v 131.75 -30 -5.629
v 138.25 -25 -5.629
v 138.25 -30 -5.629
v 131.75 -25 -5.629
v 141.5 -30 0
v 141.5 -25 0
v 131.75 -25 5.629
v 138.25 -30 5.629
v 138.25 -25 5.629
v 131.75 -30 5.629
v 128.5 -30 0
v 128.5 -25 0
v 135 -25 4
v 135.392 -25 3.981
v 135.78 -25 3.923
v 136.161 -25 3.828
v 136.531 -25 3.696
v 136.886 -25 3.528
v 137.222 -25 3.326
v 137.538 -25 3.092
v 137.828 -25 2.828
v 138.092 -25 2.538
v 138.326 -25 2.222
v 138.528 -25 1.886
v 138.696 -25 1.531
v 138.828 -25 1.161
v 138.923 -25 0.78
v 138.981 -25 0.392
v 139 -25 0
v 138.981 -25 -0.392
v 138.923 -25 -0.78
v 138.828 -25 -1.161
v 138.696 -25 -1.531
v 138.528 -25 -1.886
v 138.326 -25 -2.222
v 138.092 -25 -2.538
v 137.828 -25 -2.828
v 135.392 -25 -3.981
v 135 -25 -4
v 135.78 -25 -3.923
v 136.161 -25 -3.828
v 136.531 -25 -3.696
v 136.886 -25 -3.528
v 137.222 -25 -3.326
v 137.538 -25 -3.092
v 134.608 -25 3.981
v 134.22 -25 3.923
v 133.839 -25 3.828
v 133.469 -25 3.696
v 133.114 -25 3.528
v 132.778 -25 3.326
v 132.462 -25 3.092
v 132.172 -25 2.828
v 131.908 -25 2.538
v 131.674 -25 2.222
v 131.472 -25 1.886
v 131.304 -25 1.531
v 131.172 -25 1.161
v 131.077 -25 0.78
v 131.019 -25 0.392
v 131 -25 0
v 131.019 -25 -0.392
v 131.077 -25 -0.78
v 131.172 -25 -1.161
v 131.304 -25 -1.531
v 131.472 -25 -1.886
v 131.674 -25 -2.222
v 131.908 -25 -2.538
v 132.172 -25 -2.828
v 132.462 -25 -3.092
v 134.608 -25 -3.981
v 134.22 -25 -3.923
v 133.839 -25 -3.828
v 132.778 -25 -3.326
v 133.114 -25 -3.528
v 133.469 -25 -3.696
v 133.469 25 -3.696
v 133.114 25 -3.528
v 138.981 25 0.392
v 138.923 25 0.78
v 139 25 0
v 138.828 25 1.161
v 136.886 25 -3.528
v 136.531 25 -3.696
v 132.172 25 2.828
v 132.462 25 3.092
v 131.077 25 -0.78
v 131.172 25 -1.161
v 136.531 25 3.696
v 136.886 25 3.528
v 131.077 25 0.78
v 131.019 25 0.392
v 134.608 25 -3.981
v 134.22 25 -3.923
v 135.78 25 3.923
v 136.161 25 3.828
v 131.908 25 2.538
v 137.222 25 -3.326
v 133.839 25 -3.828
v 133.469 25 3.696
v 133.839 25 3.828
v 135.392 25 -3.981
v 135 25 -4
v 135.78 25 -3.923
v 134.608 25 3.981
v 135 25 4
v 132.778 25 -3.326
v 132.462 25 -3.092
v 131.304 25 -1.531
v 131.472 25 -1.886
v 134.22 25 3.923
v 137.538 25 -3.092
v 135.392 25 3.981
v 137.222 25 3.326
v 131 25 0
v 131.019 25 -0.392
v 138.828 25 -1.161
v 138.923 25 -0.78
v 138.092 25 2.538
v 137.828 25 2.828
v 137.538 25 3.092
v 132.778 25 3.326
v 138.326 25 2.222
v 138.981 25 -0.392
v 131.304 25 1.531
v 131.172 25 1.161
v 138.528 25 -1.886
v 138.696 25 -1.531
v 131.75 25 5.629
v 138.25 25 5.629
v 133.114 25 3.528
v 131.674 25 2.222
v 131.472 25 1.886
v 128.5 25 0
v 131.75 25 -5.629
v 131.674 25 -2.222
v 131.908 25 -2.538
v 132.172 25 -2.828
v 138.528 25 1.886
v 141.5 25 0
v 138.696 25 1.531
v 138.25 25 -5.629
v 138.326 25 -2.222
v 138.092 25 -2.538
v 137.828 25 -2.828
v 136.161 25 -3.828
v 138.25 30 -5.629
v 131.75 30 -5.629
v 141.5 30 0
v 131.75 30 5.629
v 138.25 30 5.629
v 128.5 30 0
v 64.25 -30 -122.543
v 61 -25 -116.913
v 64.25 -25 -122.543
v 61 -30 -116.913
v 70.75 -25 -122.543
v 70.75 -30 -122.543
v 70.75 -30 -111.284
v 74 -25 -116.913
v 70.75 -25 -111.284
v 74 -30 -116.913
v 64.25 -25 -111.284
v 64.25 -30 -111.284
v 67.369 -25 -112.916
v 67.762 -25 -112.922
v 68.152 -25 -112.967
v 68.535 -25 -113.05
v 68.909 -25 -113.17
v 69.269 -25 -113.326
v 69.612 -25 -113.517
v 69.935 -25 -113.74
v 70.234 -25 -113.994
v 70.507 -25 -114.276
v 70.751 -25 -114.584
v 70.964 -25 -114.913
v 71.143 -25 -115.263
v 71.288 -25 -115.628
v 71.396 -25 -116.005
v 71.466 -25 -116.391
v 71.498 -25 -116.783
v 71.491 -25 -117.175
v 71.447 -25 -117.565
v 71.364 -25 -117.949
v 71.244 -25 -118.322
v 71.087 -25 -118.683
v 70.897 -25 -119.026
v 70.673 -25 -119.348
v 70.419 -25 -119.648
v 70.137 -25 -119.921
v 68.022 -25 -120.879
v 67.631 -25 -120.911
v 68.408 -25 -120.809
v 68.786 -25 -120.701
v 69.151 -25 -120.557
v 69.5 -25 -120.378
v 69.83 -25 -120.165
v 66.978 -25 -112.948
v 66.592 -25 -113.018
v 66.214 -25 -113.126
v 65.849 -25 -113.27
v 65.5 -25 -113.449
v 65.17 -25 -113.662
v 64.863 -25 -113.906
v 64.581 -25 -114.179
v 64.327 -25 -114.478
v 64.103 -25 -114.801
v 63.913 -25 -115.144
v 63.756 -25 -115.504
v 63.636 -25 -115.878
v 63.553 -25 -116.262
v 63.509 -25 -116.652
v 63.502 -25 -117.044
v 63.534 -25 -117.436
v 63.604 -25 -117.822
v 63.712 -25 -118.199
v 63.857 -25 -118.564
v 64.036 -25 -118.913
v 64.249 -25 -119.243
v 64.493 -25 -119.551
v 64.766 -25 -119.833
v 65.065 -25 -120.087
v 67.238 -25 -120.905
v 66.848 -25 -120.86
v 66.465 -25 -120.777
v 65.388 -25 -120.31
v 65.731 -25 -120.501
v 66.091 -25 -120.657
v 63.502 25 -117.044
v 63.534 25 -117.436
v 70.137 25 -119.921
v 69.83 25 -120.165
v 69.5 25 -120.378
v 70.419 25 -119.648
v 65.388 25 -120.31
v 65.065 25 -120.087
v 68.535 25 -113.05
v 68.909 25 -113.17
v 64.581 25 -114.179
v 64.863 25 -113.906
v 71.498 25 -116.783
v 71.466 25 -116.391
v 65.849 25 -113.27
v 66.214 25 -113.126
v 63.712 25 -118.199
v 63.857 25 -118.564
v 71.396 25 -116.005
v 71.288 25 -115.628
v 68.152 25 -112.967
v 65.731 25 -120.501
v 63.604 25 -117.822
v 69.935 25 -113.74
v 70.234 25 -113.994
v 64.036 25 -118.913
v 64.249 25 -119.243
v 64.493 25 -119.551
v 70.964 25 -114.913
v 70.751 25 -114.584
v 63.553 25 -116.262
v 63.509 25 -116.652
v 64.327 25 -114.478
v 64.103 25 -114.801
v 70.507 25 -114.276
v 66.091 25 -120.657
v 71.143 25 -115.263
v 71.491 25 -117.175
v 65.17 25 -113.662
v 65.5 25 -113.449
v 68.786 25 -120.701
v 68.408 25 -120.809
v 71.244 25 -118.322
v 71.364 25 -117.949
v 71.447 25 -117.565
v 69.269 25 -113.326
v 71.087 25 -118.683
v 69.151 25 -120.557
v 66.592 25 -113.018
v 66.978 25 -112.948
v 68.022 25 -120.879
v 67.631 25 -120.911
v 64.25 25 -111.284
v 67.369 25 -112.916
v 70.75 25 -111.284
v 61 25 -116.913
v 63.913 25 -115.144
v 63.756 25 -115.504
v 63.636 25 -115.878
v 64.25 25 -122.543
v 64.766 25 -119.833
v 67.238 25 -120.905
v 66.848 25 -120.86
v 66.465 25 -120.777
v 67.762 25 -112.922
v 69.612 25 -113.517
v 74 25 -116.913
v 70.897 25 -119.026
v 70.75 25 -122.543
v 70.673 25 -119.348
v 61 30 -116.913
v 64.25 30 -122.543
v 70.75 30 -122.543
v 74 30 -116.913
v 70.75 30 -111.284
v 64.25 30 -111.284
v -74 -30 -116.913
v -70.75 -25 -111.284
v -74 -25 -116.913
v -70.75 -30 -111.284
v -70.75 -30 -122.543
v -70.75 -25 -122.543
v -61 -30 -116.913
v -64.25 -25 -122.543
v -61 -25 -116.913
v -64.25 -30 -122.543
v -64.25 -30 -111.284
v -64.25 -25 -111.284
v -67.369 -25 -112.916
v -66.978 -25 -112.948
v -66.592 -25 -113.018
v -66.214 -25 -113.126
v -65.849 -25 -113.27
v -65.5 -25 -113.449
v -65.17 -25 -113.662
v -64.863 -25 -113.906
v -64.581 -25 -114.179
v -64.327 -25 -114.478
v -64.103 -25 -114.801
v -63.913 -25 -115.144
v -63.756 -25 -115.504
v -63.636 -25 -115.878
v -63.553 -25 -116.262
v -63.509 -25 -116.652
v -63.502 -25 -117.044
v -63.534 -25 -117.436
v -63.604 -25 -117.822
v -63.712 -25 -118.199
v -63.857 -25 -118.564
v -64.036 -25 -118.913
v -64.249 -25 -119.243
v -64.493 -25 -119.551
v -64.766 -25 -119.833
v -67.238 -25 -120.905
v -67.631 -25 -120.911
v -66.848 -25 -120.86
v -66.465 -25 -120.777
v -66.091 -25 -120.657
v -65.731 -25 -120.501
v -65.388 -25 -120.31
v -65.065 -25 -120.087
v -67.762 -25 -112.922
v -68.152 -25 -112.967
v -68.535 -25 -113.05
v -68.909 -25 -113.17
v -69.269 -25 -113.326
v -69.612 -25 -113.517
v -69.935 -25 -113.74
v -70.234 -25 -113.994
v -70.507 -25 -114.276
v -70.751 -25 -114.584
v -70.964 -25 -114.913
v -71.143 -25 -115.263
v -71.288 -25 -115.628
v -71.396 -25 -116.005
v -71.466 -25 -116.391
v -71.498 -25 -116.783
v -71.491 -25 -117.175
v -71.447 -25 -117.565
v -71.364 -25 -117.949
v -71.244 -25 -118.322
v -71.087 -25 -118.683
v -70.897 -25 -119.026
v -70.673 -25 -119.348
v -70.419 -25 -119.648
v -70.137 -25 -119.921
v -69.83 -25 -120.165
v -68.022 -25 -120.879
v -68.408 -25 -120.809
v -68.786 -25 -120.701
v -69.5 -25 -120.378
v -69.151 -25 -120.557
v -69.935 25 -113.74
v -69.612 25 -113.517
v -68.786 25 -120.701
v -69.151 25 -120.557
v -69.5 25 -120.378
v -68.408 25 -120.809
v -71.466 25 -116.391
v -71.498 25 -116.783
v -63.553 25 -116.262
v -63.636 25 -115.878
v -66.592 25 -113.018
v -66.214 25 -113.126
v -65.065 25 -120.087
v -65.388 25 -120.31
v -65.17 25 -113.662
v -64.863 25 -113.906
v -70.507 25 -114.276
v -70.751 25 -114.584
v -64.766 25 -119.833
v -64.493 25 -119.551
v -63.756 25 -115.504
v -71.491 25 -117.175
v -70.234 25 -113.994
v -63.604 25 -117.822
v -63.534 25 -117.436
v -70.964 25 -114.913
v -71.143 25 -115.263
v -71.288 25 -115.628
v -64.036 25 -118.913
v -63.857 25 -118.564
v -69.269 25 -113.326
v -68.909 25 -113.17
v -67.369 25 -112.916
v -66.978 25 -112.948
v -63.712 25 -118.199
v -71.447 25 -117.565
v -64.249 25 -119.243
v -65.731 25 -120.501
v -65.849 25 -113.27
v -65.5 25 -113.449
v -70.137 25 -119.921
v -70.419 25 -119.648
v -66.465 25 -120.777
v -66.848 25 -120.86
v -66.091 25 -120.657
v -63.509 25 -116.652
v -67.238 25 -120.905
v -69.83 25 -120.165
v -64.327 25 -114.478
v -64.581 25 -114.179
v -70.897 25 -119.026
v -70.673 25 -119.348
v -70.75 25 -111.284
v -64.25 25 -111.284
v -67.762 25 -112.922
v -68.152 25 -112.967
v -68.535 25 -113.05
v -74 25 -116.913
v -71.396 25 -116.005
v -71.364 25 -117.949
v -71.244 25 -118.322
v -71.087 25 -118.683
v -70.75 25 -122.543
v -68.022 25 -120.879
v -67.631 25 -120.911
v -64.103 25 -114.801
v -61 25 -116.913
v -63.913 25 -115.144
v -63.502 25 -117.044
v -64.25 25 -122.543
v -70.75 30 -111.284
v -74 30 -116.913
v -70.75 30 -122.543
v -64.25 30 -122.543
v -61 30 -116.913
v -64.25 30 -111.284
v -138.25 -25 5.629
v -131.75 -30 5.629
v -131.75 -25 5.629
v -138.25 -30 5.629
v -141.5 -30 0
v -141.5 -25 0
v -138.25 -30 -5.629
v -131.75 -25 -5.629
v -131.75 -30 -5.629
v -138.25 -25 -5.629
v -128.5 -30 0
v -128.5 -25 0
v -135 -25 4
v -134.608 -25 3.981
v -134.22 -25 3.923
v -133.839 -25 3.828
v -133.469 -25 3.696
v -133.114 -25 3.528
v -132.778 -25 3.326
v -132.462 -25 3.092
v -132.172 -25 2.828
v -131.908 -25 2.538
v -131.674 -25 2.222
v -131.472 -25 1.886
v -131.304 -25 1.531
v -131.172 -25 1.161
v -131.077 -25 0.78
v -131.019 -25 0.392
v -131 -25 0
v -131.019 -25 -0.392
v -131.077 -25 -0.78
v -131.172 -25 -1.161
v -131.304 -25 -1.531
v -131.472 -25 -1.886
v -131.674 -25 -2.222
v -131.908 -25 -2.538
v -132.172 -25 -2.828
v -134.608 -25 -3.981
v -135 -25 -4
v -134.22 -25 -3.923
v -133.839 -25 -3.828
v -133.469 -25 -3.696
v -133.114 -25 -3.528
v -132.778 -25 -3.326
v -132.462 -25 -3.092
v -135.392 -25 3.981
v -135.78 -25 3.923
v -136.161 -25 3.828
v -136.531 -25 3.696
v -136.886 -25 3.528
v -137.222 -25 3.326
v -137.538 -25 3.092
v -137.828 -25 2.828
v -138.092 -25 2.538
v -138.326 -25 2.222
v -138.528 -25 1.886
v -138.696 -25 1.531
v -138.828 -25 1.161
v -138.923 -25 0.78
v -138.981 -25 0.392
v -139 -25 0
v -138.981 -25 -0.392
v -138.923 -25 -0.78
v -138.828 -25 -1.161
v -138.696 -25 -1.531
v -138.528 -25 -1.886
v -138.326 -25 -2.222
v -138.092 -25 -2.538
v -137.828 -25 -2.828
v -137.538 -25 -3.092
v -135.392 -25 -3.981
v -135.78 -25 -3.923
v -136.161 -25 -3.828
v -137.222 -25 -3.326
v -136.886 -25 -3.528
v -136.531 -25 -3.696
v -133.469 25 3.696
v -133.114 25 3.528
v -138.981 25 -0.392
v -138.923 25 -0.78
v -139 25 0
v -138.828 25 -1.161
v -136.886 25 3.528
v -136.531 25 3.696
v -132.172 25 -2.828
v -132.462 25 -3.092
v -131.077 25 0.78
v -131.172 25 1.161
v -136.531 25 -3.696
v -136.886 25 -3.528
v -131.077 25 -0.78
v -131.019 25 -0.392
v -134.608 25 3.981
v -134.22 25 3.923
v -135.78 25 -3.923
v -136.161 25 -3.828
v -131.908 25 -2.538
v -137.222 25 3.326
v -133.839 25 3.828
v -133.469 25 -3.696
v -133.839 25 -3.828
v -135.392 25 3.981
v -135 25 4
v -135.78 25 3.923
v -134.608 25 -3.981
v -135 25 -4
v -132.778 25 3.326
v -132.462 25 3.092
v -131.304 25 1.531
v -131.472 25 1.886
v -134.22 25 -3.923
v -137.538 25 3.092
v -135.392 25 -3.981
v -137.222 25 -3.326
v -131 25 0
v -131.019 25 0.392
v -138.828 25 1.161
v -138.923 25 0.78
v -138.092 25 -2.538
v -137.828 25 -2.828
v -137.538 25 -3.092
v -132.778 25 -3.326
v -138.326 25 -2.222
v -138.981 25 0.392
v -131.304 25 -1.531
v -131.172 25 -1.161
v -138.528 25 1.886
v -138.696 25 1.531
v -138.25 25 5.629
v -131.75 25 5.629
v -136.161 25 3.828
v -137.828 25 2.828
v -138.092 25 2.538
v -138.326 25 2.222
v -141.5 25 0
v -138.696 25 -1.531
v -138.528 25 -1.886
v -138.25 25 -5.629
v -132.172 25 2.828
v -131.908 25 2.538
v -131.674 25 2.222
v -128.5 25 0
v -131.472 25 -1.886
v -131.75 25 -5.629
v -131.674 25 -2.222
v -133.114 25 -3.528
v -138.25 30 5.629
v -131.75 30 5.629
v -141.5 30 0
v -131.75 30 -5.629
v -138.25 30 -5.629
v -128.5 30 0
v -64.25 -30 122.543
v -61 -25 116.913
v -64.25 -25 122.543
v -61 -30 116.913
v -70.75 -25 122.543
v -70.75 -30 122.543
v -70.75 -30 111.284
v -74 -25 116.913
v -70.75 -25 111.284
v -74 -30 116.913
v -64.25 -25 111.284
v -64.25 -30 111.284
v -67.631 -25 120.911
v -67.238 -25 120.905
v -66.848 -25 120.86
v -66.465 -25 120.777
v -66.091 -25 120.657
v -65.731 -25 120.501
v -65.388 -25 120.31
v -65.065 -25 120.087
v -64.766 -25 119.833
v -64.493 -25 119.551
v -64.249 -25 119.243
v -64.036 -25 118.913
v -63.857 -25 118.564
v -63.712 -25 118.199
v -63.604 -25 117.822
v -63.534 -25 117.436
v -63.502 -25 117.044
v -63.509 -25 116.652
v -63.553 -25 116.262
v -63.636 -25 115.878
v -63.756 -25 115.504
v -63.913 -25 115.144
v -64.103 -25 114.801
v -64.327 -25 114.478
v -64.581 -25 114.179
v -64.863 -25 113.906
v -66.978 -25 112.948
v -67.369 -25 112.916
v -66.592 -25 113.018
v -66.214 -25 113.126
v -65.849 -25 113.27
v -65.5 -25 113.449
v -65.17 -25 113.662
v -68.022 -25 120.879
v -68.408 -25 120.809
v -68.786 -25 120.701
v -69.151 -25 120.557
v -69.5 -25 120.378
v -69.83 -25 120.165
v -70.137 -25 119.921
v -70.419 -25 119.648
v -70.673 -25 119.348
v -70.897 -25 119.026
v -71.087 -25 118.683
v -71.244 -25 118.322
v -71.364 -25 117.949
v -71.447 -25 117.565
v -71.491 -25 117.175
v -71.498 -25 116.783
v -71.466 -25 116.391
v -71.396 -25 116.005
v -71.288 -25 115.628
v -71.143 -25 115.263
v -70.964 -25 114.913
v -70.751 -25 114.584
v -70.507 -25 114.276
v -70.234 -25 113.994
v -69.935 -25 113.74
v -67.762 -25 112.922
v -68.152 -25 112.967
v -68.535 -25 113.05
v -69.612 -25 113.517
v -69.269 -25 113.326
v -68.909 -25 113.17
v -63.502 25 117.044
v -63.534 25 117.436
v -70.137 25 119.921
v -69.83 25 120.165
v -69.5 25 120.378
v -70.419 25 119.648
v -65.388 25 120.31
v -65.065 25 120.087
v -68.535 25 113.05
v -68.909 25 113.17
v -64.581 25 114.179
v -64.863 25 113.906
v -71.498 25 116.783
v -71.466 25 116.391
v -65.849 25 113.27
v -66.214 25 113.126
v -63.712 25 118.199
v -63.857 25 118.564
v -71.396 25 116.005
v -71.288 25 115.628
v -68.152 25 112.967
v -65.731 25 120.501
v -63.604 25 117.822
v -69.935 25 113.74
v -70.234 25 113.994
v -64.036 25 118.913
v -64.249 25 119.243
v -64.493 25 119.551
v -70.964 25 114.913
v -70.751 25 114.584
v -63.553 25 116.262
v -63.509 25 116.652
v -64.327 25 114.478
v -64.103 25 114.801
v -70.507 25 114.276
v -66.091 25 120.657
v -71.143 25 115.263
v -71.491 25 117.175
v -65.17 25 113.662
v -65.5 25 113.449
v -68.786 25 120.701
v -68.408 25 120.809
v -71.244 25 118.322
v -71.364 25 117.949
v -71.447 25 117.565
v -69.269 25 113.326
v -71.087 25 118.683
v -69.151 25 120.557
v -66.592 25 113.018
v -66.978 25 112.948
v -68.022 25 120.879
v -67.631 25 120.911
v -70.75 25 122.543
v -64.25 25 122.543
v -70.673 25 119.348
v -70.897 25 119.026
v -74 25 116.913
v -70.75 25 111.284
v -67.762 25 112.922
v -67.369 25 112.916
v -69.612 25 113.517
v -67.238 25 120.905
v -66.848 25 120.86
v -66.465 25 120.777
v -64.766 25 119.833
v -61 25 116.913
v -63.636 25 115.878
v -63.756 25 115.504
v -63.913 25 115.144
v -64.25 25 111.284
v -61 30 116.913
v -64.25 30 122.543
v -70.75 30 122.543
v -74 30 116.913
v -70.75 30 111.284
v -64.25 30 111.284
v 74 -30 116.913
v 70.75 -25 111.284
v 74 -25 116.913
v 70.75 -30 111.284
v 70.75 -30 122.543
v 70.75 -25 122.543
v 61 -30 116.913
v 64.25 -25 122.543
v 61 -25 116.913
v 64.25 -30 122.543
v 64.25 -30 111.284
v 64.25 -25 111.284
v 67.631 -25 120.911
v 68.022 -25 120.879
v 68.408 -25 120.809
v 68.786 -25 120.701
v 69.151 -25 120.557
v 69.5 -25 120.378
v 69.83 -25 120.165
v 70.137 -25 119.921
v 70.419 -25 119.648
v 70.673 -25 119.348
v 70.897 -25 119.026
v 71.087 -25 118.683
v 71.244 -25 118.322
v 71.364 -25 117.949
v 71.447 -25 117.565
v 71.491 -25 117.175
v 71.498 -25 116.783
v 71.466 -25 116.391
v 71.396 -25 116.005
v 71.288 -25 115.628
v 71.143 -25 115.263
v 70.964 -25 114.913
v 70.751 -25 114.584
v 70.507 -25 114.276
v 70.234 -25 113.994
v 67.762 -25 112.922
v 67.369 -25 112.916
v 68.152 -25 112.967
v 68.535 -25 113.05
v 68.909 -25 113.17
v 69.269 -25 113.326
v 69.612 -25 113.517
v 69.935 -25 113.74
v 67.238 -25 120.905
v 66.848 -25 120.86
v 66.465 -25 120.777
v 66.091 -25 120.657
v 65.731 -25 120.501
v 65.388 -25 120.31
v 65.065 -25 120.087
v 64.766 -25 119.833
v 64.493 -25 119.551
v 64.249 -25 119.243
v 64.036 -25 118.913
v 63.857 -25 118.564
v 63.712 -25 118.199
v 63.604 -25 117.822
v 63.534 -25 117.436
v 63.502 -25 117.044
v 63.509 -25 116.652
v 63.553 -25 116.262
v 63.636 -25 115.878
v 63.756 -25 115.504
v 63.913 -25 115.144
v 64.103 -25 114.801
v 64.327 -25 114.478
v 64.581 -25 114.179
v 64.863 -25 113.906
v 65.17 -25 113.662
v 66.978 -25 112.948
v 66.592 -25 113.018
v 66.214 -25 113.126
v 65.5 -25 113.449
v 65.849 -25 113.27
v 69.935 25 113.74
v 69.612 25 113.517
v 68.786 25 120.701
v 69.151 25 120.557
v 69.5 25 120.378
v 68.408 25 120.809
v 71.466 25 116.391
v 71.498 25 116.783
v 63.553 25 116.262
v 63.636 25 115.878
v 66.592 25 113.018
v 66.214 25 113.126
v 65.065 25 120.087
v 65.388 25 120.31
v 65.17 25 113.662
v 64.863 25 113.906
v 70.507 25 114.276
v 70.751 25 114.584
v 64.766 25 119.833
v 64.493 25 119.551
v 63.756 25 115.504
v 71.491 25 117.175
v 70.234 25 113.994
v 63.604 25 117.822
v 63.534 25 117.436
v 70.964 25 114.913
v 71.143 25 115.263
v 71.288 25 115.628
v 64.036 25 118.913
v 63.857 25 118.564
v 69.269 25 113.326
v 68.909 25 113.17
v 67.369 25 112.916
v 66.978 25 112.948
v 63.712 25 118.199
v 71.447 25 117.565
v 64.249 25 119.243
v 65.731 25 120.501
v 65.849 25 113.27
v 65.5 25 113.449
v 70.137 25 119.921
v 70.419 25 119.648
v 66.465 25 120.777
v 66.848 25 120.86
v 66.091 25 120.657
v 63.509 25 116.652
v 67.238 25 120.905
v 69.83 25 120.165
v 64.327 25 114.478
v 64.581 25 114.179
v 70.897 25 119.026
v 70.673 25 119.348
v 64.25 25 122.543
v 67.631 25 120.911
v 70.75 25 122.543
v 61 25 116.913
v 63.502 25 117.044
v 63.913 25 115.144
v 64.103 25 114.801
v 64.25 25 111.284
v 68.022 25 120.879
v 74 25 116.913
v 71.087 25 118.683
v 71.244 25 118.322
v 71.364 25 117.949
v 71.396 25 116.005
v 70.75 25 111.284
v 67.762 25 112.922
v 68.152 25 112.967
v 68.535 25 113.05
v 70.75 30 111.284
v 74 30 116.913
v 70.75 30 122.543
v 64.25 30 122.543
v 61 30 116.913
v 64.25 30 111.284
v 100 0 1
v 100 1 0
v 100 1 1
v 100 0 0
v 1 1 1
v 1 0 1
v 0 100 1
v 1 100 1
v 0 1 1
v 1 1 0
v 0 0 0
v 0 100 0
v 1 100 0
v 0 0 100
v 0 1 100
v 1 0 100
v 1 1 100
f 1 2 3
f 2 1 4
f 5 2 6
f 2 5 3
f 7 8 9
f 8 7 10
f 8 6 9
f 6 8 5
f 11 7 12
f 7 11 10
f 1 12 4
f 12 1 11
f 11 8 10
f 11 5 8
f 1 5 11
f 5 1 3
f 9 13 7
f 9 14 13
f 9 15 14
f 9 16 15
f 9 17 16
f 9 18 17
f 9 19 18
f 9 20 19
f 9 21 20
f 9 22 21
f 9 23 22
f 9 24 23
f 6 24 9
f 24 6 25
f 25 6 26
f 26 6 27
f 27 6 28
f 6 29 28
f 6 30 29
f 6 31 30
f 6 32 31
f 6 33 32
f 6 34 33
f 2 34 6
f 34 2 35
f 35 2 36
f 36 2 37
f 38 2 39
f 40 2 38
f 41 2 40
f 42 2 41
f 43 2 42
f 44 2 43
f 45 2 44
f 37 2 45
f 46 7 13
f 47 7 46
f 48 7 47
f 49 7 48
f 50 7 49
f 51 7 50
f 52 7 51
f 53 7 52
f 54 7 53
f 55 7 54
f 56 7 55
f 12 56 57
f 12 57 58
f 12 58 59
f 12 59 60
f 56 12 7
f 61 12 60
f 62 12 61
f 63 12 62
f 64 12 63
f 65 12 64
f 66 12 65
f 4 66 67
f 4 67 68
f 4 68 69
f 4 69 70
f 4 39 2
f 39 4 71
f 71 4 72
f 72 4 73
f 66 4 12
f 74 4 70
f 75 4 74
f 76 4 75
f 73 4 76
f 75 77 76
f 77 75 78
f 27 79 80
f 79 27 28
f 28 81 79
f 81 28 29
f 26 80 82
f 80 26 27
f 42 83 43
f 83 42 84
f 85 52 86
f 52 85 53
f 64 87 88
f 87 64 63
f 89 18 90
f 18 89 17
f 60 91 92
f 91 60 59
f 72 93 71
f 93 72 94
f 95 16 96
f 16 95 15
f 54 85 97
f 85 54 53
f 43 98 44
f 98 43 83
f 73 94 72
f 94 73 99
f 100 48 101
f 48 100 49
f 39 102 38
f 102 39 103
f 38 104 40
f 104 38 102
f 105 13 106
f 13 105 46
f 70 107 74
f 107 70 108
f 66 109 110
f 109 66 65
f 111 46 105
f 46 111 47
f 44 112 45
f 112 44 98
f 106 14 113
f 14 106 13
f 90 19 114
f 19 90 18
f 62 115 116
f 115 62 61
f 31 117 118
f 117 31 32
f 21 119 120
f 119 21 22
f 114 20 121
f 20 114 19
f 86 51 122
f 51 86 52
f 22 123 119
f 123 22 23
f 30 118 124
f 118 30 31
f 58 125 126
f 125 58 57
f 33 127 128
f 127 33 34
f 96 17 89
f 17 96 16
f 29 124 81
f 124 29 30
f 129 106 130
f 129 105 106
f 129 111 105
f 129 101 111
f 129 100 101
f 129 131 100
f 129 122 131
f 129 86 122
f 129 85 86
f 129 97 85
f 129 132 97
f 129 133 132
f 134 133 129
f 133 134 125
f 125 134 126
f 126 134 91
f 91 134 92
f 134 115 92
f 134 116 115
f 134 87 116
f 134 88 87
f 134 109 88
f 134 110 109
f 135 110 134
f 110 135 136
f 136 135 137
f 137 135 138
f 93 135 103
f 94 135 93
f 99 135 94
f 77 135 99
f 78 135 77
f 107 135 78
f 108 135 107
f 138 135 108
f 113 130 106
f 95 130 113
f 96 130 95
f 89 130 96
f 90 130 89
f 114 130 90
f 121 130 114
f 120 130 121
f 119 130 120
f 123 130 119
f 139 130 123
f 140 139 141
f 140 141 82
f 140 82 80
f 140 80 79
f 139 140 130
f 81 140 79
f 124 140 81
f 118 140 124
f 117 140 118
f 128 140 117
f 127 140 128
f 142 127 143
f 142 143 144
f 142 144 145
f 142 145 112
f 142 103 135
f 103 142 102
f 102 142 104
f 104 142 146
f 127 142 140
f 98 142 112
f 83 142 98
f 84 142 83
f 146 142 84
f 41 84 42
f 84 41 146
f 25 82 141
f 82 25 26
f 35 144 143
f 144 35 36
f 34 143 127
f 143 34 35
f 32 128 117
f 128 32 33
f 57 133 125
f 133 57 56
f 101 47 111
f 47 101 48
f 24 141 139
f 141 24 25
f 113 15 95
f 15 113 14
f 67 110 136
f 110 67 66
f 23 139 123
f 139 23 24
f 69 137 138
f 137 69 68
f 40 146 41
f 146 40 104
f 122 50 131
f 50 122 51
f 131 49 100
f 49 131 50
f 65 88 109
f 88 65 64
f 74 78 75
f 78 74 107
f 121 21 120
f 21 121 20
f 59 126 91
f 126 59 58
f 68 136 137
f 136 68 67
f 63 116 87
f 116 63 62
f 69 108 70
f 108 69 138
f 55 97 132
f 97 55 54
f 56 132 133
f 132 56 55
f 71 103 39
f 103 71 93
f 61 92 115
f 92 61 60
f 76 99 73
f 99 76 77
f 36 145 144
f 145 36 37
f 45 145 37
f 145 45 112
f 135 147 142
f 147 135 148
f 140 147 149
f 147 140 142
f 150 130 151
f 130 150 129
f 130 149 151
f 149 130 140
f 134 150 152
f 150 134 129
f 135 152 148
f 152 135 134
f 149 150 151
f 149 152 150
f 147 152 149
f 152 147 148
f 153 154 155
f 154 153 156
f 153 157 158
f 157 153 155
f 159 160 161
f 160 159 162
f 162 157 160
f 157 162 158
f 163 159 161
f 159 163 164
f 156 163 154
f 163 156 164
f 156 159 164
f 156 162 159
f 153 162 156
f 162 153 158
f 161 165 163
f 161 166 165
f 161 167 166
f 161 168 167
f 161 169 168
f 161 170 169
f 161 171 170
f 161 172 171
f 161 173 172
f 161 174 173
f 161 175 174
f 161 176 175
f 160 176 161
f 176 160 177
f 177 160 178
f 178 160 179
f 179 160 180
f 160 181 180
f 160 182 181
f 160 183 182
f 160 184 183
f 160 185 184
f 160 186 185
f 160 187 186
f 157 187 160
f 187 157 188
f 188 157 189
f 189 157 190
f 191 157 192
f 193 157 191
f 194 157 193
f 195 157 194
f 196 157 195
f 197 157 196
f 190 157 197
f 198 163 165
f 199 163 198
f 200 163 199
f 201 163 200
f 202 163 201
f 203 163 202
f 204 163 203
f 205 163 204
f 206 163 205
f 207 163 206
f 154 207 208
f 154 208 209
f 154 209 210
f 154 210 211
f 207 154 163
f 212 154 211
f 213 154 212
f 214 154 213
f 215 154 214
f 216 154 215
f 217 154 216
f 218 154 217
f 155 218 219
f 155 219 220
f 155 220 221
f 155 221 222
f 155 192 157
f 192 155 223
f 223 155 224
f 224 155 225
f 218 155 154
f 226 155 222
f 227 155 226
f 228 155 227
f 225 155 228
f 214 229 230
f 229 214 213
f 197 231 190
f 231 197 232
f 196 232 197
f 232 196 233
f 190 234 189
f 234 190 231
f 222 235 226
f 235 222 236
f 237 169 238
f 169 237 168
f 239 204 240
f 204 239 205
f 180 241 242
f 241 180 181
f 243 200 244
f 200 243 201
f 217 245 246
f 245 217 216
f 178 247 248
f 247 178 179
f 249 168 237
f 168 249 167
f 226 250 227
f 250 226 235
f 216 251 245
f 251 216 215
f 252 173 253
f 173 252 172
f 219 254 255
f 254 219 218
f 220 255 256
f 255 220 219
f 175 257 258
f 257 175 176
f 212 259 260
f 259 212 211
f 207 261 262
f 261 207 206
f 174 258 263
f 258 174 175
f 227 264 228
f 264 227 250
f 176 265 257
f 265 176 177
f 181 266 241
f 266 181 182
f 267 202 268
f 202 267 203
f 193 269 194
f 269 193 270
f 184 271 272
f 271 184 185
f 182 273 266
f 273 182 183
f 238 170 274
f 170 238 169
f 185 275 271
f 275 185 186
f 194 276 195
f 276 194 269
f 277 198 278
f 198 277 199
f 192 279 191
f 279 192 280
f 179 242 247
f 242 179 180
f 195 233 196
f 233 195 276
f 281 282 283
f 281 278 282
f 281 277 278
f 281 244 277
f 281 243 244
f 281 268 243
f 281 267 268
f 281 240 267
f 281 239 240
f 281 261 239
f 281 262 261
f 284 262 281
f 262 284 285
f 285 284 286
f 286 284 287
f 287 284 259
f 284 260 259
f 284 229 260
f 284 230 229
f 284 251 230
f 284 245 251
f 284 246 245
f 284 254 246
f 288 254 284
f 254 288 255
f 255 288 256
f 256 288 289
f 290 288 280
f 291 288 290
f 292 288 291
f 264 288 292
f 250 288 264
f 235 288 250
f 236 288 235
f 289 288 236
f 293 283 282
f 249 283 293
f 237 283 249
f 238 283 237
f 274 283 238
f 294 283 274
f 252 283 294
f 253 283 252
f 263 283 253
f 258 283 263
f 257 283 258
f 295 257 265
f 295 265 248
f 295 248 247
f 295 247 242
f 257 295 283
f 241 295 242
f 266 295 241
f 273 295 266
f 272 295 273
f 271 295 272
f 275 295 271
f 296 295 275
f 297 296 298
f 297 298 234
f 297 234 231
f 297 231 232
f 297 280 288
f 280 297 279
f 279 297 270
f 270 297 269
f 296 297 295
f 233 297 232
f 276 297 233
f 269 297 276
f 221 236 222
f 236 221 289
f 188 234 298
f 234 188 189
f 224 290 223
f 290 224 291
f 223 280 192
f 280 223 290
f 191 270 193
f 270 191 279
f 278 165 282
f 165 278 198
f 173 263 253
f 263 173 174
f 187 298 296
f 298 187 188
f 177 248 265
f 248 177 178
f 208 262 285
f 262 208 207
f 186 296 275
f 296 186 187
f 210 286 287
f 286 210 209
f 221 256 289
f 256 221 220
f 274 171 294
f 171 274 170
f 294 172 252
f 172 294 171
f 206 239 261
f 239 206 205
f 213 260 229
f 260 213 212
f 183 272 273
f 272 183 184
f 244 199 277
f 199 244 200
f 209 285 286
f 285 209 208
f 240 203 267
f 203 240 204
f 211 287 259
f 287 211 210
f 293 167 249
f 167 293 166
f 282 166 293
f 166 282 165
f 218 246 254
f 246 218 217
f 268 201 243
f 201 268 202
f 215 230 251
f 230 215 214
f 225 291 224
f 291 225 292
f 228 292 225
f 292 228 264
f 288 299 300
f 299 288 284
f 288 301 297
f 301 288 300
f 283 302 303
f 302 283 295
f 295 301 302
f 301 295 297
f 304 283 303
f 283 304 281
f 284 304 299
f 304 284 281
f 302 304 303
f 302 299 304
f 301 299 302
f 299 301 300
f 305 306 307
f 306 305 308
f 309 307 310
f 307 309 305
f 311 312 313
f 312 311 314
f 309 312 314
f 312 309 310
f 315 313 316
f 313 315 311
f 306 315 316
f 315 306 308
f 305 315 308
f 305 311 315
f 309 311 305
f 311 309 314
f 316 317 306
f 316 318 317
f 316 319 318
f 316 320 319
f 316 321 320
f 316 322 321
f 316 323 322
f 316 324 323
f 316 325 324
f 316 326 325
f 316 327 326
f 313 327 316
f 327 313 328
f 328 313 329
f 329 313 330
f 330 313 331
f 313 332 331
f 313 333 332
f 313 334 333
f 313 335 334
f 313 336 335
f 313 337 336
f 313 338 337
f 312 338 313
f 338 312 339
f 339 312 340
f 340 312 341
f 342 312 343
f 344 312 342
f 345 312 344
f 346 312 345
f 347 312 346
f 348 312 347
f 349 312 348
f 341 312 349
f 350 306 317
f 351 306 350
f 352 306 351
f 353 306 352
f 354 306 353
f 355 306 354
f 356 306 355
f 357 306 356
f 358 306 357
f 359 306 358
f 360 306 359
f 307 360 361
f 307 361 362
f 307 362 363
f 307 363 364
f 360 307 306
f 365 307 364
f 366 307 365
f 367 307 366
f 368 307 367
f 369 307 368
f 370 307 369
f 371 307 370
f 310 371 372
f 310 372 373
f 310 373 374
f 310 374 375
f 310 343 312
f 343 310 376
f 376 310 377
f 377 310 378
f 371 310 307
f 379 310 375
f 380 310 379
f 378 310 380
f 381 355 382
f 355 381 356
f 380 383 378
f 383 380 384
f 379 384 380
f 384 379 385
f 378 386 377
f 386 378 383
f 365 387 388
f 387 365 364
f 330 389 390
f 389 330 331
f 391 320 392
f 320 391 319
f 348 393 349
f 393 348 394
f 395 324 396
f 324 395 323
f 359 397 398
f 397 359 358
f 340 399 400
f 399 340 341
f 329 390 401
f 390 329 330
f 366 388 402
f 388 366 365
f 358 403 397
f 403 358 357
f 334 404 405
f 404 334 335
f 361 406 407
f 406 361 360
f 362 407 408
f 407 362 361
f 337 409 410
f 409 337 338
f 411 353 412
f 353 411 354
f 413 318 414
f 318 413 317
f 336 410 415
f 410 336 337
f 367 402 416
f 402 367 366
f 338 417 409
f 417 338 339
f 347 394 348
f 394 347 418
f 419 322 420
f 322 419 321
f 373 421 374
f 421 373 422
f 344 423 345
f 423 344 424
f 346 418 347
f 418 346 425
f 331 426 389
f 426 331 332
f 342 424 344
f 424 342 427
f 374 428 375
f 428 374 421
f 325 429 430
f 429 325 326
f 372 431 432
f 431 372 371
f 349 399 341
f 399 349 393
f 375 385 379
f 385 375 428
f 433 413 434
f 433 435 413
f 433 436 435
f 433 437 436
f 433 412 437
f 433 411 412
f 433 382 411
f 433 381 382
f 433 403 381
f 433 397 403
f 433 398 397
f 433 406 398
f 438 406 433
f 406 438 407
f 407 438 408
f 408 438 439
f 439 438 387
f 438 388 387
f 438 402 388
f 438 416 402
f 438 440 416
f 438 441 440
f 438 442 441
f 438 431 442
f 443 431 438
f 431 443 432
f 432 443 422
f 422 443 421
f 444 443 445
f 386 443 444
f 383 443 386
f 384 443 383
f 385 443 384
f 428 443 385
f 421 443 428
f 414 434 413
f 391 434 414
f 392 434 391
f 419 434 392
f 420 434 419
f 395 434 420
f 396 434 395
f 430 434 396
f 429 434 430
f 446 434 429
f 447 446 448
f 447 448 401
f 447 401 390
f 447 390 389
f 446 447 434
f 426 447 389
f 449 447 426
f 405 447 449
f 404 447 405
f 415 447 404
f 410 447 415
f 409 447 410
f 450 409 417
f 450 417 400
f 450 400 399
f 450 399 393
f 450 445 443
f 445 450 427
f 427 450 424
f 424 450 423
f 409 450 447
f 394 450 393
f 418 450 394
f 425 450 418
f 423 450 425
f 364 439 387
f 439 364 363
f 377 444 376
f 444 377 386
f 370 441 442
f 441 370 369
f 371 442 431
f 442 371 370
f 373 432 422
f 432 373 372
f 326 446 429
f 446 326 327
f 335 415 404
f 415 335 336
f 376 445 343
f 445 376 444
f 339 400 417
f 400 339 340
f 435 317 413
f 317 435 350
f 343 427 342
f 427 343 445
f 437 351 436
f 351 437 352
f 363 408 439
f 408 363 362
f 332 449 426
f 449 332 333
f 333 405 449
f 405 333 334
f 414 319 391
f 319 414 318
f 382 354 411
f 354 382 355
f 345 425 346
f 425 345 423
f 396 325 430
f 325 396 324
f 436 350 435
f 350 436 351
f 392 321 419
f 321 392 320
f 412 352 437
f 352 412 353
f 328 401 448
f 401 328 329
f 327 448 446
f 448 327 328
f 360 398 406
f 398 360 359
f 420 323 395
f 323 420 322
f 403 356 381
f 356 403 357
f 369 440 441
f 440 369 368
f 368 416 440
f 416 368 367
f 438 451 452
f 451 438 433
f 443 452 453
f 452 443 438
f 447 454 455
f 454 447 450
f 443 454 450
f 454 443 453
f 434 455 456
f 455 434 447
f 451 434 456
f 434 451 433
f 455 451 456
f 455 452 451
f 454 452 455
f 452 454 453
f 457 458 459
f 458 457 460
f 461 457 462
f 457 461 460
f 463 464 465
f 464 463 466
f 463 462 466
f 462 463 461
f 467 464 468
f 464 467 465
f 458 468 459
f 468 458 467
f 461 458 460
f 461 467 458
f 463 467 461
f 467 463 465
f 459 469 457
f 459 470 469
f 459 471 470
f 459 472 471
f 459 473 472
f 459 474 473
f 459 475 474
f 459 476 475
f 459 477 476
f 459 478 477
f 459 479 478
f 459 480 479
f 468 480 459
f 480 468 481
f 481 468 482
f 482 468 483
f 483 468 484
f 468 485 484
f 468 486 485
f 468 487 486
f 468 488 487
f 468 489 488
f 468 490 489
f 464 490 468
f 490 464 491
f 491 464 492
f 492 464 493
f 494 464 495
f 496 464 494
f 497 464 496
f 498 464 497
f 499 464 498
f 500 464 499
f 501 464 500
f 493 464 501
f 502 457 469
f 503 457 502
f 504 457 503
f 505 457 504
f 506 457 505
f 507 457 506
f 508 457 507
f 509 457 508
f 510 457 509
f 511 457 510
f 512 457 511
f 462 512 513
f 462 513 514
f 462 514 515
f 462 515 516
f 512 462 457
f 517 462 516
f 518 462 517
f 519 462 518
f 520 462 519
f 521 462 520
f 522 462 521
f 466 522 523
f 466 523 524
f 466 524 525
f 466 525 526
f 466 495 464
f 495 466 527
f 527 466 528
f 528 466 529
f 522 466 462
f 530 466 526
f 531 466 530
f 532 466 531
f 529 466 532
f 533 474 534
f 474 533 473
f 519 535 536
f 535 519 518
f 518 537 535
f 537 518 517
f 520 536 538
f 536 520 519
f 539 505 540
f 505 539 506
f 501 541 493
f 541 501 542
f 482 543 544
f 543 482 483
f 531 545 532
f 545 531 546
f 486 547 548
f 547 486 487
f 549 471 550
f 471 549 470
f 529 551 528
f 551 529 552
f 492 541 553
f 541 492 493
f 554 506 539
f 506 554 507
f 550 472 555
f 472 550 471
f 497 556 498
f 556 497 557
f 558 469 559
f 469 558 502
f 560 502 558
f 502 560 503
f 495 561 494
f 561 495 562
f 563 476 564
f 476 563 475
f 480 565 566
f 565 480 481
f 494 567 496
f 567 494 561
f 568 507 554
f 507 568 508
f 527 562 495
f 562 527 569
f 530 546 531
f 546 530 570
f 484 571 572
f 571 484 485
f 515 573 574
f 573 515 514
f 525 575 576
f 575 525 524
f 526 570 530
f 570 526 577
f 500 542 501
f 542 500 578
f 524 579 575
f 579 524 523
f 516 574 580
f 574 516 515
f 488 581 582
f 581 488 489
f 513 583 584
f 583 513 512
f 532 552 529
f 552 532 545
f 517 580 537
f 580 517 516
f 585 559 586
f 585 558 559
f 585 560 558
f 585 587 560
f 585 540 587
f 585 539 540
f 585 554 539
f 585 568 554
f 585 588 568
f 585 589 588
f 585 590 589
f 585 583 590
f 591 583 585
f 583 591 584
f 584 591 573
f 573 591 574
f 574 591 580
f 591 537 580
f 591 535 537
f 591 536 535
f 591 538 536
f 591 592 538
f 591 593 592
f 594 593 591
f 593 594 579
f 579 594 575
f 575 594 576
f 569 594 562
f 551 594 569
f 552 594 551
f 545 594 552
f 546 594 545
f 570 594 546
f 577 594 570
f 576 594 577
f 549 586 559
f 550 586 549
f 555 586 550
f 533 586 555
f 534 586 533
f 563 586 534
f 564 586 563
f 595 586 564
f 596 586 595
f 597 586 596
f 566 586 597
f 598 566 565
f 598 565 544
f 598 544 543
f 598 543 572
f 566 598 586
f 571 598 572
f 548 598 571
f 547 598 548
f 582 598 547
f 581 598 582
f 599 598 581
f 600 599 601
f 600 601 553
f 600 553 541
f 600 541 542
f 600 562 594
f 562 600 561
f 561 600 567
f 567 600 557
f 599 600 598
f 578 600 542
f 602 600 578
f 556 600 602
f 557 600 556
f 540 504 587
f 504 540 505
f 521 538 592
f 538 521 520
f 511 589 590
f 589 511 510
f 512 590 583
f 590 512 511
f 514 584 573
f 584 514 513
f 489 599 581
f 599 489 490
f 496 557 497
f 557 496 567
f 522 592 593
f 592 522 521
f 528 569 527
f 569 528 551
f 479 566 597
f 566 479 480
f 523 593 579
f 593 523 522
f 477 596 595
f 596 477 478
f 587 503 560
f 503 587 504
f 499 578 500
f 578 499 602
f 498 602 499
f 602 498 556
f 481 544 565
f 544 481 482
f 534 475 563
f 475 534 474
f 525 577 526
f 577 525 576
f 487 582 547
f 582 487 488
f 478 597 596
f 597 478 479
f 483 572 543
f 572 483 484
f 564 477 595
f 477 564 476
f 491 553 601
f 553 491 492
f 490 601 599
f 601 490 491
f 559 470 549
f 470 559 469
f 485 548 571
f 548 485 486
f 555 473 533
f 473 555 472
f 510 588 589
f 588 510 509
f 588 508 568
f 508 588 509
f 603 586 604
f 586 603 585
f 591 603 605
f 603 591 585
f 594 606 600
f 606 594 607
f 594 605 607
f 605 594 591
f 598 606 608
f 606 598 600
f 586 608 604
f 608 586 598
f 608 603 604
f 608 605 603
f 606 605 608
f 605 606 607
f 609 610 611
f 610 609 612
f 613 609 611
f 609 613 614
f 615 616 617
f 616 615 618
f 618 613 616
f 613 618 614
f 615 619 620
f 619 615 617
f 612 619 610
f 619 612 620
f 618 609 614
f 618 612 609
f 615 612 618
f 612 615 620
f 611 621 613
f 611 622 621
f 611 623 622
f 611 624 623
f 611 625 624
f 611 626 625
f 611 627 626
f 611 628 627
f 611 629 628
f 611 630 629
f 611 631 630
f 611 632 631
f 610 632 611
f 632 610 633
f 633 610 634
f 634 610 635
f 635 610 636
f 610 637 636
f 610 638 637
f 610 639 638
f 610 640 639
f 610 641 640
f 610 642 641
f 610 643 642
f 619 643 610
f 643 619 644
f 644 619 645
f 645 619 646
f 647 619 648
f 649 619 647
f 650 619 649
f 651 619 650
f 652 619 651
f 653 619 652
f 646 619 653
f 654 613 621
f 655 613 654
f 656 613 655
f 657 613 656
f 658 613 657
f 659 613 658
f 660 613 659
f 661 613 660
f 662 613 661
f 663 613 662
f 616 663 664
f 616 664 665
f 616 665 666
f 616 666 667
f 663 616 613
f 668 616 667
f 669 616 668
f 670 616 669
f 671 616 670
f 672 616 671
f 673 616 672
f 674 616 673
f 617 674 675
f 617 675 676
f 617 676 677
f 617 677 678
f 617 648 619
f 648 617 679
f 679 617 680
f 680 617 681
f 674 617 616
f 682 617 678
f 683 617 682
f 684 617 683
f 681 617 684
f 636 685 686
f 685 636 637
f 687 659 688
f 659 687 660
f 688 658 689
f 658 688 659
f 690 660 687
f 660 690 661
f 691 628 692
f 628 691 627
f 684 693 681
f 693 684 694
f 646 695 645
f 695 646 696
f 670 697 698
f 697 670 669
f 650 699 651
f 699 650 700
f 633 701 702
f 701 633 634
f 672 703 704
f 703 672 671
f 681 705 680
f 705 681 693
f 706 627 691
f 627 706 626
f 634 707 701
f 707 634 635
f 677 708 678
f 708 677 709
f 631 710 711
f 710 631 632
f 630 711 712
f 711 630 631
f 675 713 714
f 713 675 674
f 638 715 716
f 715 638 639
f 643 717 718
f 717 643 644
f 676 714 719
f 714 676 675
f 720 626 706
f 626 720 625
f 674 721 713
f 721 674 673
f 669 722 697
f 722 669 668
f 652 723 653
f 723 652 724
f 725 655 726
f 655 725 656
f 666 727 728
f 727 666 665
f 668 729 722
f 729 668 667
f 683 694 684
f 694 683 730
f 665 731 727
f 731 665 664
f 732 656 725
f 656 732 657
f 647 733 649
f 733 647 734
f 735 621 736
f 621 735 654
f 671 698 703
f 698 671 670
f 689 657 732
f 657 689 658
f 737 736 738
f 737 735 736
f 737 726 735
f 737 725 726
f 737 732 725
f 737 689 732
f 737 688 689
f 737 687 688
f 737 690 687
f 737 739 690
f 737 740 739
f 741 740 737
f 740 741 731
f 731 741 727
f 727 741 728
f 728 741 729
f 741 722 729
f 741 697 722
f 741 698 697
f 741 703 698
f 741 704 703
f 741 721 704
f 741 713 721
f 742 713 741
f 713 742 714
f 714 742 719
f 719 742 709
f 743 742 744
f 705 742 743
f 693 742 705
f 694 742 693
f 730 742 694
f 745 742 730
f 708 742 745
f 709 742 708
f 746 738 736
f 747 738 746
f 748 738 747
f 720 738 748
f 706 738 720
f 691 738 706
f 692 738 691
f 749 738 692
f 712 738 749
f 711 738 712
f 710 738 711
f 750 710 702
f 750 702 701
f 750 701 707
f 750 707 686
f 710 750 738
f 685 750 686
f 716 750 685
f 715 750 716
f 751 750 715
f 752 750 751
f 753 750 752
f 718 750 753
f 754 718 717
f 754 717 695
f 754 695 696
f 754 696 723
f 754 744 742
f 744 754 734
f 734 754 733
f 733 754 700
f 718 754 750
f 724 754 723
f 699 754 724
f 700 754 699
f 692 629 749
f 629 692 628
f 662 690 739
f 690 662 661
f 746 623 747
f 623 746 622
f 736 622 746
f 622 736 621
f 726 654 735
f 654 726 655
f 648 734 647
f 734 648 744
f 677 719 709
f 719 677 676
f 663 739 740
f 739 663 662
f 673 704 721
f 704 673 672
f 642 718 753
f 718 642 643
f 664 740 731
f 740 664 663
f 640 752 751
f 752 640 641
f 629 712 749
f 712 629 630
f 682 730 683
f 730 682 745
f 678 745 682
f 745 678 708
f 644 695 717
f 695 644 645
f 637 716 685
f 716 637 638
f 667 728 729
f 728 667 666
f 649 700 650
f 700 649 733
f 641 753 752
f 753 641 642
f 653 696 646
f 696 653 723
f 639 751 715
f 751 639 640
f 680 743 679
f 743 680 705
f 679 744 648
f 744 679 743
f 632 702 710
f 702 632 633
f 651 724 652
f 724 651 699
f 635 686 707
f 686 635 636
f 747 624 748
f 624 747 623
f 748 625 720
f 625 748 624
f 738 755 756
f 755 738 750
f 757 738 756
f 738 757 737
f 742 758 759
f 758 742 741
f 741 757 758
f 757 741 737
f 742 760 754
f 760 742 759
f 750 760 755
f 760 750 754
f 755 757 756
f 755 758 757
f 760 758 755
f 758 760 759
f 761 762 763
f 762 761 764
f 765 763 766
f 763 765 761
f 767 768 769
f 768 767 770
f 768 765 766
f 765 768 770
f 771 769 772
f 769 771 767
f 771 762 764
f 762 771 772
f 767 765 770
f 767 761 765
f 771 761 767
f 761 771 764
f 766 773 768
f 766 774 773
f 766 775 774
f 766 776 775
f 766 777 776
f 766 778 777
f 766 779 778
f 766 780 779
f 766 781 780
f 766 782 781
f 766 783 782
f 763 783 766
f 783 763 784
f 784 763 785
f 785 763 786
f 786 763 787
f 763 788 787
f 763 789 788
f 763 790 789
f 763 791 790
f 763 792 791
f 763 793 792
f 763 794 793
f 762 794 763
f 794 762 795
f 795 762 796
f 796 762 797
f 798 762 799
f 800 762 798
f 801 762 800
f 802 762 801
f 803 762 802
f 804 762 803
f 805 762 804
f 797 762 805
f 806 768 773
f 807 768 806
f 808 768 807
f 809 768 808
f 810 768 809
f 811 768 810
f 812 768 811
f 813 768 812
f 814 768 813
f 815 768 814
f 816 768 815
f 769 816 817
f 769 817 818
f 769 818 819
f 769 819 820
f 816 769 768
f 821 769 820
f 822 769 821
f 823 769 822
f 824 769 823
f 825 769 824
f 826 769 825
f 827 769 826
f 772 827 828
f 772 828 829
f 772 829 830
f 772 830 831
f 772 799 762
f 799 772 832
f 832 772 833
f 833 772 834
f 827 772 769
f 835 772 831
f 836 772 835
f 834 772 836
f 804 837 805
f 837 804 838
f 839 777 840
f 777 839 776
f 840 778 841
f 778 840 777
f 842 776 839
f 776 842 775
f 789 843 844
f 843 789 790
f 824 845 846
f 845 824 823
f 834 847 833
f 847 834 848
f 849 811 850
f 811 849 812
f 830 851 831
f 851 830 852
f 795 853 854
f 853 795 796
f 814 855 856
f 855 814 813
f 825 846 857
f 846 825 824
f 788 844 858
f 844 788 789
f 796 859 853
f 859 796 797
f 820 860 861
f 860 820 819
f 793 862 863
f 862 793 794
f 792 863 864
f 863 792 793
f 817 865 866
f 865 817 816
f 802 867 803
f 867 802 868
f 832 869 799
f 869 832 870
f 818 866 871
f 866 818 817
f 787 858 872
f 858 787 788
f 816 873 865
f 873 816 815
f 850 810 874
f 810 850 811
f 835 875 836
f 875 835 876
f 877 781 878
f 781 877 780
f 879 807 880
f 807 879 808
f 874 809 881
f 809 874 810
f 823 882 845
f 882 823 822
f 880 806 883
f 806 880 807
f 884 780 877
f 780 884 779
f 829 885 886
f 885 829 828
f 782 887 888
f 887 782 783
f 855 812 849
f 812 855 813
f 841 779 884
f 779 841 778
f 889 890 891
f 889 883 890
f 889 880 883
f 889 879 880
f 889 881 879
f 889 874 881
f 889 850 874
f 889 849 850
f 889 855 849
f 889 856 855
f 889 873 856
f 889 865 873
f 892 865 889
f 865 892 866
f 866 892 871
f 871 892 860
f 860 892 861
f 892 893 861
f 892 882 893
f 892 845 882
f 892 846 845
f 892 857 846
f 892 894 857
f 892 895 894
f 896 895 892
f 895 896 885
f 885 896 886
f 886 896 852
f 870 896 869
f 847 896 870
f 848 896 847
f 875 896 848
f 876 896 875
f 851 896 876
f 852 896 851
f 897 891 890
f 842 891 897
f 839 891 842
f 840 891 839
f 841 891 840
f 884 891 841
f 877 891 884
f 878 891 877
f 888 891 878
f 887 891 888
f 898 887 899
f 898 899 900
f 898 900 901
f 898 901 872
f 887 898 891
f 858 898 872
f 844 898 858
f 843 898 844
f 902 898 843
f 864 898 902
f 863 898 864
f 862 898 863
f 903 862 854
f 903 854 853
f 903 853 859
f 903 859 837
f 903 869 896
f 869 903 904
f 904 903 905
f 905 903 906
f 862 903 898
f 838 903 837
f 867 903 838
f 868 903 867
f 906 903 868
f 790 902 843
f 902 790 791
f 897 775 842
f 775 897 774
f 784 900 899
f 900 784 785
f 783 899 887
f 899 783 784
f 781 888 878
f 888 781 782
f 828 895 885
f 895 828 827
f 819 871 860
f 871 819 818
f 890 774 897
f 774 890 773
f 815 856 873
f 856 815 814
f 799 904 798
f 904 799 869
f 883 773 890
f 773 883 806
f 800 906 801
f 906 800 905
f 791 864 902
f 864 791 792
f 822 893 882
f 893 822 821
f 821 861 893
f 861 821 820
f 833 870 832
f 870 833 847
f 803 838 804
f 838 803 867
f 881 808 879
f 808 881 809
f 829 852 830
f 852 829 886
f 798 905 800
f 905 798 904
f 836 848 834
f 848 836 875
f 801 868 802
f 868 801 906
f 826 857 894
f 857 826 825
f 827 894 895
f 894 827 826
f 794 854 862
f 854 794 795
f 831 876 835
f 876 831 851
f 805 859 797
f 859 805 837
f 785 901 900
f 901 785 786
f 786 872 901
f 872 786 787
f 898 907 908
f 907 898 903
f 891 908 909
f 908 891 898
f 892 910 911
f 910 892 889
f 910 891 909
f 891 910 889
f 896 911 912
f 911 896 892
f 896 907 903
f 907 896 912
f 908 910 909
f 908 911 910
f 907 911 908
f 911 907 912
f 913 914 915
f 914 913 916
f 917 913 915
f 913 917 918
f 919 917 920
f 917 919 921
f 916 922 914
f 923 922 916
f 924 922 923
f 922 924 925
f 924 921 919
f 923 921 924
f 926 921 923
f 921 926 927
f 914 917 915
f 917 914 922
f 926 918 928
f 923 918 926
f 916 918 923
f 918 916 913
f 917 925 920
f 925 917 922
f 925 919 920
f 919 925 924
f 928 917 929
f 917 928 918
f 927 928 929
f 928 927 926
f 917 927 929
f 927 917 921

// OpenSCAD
// file: parts.scad
include <master_dims.scad>

$fn = 64;

// ---------------------------------------------------------
// 1. FRONT TIRE (Root Anchor)
// 155/70 R13
// Oriented along Y-axis (rotating axis)
// ---------------------------------------------------------
module car_tire_13in() {
    color([0.15, 0.15, 0.15])
    rotate([90, 0, 0])
    rotate_extrude()
    translate([front_rim_dia/2, 0, 0])
    hull() {
        // Sidewall inner
        circle(d=40);
        // Tread outer (flattened)
        translate([(front_tire_od - front_rim_dia)/2, 0, 0])
        square([10, front_tire_width], center=true);
    }
}

// ---------------------------------------------------------
// 2. FRONT RIM (Mates to Tire)
// Split Rim: Two halves bolted together
// ---------------------------------------------------------
module car_rim_half() {
    rotate([90, 0, 0])
    rotate_extrude()
    difference() {
        union() {
            // Main bead seat and flange
            translate([front_rim_dia/2 - 10, 0, 0])
            square([20, front_tire_width/2 - 5], center=false);

            // Mating flange for splitting (10mm thick)
            translate([front_rim_dia/2 - 100, 0, 0])
            square([100, 10], center=false);
        }
        // Bead seat profile
        translate([front_rim_dia/2, front_tire_width/2 - 5, 0])
        circle(d=10);
    }
}

module car_rim_13in_split() {
    color("silver") {
        // Left half (Meets at y=0, Outer at y=10)
        translate([0, 0, 0])
        car_rim_half();

        // Right half (Meets at y=0, Outer at y=-10)
        translate([0, 0, 0])
        mirror([0, 1, 0])
        car_rim_half();
    }
}

// ---------------------------------------------------------
// 3. FASTENERS
// ---------------------------------------------------------
module m8_bolt_nut(length=50) {
    // Bolt head
    translate([0, 0, length/2])
    color("gray")
    cylinder(d=13, h=5, $fn=6, center=false);

    // Shaft
    color("silver")
    cylinder(d=8, h=length, center=true);

    // Nut
    translate([0, 0, -length/2 - 5])
    color("gray")
    cylinder(d=13, h=5, $fn=6, center=false);
}

module rim_fastener_pattern() {
    pcd = front_rim_dia - 60;
    for(a=[0:60:359]) {
        rotate([0, a, 0])
        translate([pcd/2, 0, 0]) // Centered at y=0
        rotate([90, 0, 0])
        m8_bolt_nut(50);
    }
}

// ---------------------------------------------------------
// 4. HUB MOTOR (Mates to Rim)
// ---------------------------------------------------------
module hub_motor_dd() {
    // Motor body
    color("dimgray")
    rotate([90, 0, 0])
    cylinder(d=220, h=front_hub_dropout - 40, center=true);

    // Mounting Flanges (Sandwich the rim halves)
    // Outer faces of rim are at +/- 10.
    // Flanges should be at +/- 15 (centered on 10mm width)
    // so inner faces are at +/- 10.
    // Flange diameter 290mm to capture the 270mm PCD bolt pattern.
    for(s=[-1, 1]) translate([0, s * 15, 0])
    rotate([90, 0, 0])
    color("gray") cylinder(d=290, h=10, center=true);

    // AXLE (The physical connection to the Fork)
    color("black")
    rotate([90, 0, 0])
    cylinder(d=front_axle_dia, h=front_hub_dropout + 40, center=true);
}

// ---------------------------------------------------------
// UTILITY SHAPES
// ---------------------------------------------------------
module rect_tube(w, h, l, t=2.5) {
    difference() {
        cube([l, w, h], center=true);
        cube([l+2, w-2*t, h-2*t], center=true);
    }
}

module pipe(od, id, h) {
    difference() {
        cylinder(d=od, h=h, center=true);
        cylinder(d=id, h=h+2, center=true);
    }
}
// file: master_dims.scad
// master_dims.scad - Central dimensions for Industrial E-Bakfiets

// Standard Units: mm

// 1. FRONT TIRE (The Anchor)
front_tire_od = 548;
front_tire_width = 155;
front_rim_dia = 330;

// 2. FRONT HUB / MOTOR
front_hub_dropout = 175;
front_hub_flange_dia = 180;
front_axle_dia = 14;

// 3. FRONT FORK
fork_inner_spacing = 185;
fork_blade_width = 30;
fork_crown_width = 250;
fork_length = 360;
fork_rake = 45;

// 4. STEERING HEAD
head_angle = 68;
steering_shaft_dia = 15;
bearing_od = 35;
bearing_h = 11;
head_tube_od = 42.16;
head_tube_id = 35.05;
head_tube_length = 200;

// 5. FRAME
bed_width = 810;
bed_length = 1250;
main_spar_size = 40;
ground_clearance = 150;
wheelbase = 1950;

// 6. REAR END
rear_wheel_dia = 410;
rear_dropout_spacing = 135;
bb_height = 285;
bb_offset_x = 450;

// 7. CARGO BOX
box_height = 600;
box_wall_t = 12;

// 8. STABILIZERS
stab_size = 35;
stab_deploy_len = 250;
// main file
include <master_dims.scad>
use <parts.scad>
rim_fastener_pattern();
// Reference axes
color("red") cube([100, 1, 1]); // X
color("green") cube([1, 100, 1]); // Y
color("blue") cube([1, 1, 100]); // Z
